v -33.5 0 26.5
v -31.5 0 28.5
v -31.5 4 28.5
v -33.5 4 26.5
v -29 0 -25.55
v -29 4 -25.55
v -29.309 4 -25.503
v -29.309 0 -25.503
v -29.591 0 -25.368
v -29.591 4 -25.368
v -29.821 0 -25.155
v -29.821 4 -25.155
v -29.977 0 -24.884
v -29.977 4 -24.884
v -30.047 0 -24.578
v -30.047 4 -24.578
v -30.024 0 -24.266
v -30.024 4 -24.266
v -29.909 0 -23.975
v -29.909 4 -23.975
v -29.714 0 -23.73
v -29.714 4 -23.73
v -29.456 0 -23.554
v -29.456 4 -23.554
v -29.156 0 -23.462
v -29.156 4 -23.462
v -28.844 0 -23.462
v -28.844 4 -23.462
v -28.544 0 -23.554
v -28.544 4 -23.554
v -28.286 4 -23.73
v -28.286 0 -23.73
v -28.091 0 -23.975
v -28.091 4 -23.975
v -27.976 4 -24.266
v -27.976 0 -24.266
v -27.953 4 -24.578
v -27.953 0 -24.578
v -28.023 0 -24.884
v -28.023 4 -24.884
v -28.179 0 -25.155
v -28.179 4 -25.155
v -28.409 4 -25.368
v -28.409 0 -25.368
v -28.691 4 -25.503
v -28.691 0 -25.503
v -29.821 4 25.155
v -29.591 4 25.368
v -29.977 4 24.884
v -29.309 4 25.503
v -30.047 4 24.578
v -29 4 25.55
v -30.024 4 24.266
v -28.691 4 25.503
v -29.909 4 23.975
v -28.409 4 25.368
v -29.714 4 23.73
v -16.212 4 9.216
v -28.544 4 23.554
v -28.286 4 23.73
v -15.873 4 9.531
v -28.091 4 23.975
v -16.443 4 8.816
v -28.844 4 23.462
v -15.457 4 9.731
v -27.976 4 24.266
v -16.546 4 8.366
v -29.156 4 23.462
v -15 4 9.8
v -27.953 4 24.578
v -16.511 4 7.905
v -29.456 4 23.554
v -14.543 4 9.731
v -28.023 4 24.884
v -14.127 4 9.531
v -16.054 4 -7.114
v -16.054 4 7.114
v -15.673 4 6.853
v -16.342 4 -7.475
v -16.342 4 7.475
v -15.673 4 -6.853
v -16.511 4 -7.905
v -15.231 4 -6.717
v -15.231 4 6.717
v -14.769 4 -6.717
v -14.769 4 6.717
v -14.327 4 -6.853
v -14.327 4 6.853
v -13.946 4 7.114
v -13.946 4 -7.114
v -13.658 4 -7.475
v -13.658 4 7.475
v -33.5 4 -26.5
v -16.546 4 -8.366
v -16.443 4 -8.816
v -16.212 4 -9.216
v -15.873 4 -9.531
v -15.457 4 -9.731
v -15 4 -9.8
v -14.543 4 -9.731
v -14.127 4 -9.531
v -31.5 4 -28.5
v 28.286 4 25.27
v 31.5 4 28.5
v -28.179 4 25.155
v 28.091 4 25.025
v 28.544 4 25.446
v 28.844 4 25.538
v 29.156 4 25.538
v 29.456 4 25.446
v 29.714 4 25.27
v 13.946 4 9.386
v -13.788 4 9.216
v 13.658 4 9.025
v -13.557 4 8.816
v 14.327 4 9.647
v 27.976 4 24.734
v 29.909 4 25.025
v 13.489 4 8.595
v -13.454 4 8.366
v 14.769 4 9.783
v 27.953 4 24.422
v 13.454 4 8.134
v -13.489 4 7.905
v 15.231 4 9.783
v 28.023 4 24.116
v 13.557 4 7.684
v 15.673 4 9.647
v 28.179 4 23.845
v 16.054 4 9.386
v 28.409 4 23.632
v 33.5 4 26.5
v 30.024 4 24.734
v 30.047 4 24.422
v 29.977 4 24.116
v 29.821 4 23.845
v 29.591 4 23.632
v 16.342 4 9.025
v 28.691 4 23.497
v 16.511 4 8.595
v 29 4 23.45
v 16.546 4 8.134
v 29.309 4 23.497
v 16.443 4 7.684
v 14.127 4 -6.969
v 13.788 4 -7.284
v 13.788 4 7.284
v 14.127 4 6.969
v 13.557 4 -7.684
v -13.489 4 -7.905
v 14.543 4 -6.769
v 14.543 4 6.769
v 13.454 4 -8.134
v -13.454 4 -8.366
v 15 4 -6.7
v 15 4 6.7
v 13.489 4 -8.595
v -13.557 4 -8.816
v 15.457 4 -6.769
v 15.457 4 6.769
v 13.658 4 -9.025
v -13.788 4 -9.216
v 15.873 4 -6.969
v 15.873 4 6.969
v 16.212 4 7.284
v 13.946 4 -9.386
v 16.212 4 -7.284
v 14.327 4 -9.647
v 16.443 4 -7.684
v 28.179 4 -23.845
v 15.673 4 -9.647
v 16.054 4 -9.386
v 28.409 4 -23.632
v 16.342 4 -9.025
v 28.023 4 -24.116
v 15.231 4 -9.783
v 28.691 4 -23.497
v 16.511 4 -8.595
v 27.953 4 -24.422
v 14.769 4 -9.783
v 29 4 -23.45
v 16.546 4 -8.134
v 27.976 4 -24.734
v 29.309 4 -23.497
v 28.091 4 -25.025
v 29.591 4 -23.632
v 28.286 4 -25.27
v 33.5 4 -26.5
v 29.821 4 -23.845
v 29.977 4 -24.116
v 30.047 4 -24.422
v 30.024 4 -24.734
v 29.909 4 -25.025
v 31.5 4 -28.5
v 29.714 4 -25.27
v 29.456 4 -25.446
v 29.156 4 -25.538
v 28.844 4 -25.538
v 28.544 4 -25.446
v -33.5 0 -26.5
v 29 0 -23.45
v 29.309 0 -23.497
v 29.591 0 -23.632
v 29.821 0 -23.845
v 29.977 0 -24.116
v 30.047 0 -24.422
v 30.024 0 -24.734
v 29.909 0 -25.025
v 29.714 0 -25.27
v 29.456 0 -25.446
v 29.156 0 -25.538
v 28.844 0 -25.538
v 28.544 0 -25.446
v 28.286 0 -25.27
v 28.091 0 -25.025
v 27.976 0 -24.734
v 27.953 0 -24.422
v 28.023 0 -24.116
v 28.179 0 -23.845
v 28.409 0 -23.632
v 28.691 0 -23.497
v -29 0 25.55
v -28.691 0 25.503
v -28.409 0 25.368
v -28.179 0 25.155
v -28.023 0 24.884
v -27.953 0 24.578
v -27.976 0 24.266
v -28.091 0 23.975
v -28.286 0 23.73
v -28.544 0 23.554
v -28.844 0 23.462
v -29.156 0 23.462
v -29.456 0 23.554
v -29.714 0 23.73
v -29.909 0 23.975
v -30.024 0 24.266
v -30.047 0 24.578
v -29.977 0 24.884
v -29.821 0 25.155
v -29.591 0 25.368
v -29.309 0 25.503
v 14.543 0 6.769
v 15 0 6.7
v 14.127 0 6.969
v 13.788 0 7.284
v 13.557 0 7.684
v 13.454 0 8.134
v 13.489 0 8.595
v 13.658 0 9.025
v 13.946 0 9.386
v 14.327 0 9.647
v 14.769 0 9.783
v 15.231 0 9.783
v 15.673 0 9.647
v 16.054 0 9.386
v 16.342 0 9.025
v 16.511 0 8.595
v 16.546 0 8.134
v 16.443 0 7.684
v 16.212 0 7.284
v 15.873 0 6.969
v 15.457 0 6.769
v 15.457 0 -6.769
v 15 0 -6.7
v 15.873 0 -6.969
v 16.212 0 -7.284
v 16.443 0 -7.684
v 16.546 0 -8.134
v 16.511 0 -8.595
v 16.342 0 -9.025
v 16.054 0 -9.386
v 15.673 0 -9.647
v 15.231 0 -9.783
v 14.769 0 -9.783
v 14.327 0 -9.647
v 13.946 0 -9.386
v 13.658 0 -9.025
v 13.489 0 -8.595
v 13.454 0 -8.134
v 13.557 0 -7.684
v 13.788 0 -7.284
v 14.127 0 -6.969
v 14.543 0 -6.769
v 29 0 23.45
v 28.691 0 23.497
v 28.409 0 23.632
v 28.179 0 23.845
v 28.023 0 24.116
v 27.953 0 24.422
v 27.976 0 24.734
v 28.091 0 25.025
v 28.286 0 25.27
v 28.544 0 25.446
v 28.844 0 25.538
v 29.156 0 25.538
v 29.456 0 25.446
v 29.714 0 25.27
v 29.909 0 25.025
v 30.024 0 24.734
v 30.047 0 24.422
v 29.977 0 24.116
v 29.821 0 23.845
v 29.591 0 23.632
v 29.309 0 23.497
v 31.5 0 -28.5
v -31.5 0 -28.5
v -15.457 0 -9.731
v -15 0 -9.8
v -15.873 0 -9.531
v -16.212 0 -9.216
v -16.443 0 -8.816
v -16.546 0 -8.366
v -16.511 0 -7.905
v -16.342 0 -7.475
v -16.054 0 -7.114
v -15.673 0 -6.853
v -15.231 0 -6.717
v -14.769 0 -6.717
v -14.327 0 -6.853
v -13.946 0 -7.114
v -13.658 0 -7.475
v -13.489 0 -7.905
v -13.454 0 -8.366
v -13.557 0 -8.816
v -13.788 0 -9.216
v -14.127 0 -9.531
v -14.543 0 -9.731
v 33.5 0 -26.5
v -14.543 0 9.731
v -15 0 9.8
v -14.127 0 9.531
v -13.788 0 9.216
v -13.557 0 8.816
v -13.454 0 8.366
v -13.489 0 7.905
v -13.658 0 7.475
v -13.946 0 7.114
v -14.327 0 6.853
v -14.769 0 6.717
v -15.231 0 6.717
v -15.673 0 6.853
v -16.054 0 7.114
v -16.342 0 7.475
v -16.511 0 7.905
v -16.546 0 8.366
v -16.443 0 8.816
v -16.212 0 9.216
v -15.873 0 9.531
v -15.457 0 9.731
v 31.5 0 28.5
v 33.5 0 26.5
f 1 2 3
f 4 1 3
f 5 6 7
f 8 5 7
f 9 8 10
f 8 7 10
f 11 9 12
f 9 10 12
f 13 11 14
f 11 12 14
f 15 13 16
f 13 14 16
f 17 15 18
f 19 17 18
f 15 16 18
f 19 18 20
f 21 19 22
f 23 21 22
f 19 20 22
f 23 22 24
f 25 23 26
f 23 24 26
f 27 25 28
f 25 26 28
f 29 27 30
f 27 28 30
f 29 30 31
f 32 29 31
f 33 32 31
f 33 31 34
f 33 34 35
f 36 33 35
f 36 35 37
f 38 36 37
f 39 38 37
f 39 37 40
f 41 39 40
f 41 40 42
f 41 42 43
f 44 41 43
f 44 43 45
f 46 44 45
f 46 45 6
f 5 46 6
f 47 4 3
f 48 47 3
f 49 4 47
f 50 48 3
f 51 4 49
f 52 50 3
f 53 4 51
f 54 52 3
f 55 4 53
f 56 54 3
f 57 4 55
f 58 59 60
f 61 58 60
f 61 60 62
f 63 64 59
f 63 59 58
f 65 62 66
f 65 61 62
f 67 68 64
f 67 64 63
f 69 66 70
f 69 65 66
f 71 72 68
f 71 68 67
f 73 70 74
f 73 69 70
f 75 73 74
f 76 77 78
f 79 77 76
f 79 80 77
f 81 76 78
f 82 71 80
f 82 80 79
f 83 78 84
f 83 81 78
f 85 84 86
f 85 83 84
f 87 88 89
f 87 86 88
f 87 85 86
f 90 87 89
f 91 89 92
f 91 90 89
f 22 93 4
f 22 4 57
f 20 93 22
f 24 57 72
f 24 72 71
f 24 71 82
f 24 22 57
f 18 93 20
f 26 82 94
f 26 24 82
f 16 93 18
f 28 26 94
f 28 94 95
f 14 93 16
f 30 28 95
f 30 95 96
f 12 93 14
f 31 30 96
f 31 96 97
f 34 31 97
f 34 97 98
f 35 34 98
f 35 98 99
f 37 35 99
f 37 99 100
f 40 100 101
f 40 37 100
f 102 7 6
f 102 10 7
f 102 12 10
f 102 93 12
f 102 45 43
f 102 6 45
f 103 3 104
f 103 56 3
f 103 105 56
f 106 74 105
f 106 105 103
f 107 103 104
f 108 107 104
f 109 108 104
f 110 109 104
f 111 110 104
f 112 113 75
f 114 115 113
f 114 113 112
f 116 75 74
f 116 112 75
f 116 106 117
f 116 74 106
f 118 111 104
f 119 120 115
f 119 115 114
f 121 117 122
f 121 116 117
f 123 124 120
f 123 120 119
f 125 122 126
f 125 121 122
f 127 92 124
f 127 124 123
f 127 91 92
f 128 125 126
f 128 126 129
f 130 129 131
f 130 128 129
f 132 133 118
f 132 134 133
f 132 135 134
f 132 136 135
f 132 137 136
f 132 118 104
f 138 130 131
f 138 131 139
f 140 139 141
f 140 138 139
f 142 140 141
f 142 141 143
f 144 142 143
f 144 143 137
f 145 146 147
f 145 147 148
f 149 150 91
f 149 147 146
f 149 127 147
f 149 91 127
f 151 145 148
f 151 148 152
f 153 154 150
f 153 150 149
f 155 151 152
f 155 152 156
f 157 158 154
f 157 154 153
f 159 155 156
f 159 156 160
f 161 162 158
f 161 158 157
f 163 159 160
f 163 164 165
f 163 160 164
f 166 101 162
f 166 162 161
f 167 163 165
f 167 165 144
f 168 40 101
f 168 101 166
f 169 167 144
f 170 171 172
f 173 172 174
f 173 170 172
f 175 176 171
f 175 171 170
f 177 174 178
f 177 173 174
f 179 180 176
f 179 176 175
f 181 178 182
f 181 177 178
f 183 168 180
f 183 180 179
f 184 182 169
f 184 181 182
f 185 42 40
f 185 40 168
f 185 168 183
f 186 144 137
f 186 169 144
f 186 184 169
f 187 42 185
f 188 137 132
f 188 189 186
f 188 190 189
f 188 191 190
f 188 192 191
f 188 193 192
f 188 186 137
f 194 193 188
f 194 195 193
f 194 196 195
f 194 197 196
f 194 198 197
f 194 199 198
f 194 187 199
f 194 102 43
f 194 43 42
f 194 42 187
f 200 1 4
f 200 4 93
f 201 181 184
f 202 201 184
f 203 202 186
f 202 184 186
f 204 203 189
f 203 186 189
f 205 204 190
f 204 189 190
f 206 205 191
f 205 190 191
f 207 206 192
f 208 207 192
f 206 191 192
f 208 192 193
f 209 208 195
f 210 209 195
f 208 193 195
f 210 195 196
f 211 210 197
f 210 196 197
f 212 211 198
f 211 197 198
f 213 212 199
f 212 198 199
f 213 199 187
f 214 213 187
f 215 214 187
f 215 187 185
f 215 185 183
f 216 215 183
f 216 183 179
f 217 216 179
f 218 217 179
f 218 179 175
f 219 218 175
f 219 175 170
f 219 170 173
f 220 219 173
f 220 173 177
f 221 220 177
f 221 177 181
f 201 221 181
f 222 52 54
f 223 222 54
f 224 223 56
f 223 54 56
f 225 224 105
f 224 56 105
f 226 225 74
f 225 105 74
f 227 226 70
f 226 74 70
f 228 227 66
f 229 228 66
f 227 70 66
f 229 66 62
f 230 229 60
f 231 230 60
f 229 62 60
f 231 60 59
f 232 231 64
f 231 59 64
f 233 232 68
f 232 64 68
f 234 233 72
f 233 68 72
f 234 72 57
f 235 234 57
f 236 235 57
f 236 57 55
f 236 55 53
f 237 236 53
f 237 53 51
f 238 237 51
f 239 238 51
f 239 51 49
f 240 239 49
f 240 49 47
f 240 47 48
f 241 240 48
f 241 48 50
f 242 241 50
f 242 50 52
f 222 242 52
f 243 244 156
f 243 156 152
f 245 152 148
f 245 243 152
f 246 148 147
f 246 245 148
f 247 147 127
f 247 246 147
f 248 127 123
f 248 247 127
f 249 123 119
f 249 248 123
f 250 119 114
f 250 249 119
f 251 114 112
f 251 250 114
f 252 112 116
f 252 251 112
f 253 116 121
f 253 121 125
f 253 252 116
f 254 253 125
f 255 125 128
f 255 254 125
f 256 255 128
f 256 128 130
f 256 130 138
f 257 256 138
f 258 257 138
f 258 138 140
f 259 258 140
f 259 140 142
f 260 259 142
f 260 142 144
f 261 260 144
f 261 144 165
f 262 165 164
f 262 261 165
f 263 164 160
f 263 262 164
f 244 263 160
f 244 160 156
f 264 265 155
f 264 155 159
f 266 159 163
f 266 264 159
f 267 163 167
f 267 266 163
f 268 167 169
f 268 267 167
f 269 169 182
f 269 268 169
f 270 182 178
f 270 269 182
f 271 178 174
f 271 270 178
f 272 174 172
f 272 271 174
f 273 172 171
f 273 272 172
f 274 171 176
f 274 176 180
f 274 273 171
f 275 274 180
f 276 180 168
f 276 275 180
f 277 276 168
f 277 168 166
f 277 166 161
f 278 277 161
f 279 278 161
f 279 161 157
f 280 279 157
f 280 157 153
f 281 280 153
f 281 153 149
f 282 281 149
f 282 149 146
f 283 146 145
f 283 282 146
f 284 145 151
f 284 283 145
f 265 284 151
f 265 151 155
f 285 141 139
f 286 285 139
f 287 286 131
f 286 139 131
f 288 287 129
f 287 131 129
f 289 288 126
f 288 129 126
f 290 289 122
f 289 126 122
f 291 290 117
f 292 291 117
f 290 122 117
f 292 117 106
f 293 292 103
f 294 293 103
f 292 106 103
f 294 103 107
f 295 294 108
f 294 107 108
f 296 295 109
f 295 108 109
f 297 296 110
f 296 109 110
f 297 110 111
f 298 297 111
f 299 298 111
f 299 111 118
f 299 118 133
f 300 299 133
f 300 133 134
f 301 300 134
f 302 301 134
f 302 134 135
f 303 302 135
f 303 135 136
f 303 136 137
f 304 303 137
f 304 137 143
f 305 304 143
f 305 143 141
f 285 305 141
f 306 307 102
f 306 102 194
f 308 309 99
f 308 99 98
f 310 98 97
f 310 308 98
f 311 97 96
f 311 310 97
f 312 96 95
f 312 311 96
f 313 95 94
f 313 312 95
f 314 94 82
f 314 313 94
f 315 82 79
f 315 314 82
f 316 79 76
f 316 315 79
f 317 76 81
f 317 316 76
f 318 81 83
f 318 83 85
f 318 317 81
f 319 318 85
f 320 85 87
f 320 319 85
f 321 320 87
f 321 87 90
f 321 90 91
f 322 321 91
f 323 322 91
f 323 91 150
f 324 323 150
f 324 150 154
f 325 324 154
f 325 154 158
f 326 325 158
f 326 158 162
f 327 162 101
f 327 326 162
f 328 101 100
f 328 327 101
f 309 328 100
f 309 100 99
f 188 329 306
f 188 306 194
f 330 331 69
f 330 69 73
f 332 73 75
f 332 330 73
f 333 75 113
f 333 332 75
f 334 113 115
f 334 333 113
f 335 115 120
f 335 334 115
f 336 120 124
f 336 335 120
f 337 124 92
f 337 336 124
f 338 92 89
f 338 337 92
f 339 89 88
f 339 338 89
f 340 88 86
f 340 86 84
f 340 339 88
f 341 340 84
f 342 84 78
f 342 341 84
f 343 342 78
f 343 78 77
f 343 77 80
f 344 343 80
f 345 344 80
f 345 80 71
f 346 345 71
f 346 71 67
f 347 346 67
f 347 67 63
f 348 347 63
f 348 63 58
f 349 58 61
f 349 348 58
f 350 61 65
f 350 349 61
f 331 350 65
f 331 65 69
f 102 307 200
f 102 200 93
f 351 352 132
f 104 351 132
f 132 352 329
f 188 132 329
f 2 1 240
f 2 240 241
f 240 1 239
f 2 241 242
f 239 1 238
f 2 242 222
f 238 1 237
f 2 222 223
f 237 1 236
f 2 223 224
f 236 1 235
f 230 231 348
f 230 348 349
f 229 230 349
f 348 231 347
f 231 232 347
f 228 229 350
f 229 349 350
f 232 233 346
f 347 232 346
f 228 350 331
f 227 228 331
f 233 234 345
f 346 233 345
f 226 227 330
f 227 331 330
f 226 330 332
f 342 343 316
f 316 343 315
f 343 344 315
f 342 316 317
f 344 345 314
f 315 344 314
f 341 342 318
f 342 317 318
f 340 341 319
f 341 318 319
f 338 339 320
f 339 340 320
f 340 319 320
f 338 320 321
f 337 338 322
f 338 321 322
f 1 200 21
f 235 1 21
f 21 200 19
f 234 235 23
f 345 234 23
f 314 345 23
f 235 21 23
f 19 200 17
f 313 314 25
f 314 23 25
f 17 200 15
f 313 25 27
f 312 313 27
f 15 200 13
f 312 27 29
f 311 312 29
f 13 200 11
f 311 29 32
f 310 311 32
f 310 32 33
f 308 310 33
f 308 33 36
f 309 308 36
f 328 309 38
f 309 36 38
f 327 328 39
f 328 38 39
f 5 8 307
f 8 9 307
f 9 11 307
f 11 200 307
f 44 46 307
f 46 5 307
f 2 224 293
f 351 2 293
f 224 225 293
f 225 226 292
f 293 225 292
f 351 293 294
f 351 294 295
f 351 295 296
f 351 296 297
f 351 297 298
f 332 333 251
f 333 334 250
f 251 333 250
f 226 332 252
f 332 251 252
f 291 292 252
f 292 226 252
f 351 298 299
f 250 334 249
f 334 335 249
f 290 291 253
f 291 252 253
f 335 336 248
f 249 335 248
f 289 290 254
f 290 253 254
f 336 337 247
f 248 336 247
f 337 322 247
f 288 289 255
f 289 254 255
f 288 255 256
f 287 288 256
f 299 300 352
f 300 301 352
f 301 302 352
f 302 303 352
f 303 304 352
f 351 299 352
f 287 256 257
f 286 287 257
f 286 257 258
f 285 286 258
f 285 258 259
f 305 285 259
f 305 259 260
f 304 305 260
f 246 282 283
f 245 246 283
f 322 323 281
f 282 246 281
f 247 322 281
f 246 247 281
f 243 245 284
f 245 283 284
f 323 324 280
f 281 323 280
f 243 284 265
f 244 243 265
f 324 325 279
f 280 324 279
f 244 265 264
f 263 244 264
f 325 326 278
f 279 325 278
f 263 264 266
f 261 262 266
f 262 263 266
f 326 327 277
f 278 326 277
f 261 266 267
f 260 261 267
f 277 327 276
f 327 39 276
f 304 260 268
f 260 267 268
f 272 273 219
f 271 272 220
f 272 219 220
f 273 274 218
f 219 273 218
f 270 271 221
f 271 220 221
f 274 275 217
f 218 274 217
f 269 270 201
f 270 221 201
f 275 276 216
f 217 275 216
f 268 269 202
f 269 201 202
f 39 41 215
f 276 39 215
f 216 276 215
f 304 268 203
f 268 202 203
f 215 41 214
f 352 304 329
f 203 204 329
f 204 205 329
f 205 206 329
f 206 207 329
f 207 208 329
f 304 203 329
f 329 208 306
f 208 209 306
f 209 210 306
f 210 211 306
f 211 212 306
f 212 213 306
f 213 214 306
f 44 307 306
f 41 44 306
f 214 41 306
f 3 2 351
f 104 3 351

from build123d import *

# Parameters (mm, degrees)
SKETCH1_W           = 67
SKETCH1_H           = 57
SKETCH1_R           = 1.55
BOSS_EXTRUDE1_DEPTH = 4
SKETCH2_R           = 1.05
CUT_EXTRUDE1_DEPTH  = 45.164465354
CHAMFER1_SIZE       = 2


with BuildPart() as part:
    # Sketch1 → Boss-Extrude1 (new body)
    with BuildSketch(Plane(origin=(0, 0, 0), x_dir=(1, 0, 0), z_dir=(0, 1, 0))):
        Rectangle(SKETCH1_W, SKETCH1_H)
        with Locations(Location((15, 8.25, 0), (0, 0, 270))):
            Circle(SKETCH1_R, mode=Mode.SUBTRACT)
        with Locations(Location((-15, 8.25, 0), (0, 0, 90))):
            Circle(SKETCH1_R, mode=Mode.SUBTRACT)
        with Locations(Location((-15, -8.25, 0), (0, 0, 270))):
            Circle(SKETCH1_R, mode=Mode.SUBTRACT)
        with Locations(Location((15, -8.25, 0), (0, 0, 90))):
            Circle(SKETCH1_R, mode=Mode.SUBTRACT)
    extrude(amount=BOSS_EXTRUDE1_DEPTH)

    # Sketch2 → Cut-Extrude1 (cut, through all)
    with BuildSketch(Plane(origin=(0, 4, 0), x_dir=(1, 0, 0), z_dir=(0, 1, 0))):
        with Locations(Location((29, 24.5, 0), (0, 0, 270))):
            Circle(SKETCH2_R)
        with Locations(Location((-29, 24.5, 0), (0, 0, 90))):
            Circle(SKETCH2_R)
        with Locations(Location((-29, -24.5, 0), (0, 0, 270))):
            Circle(SKETCH2_R)
        with Locations(Location((29, -24.5, 0), (0, 0, 90))):
            Circle(SKETCH2_R)
    extrude(amount=-CUT_EXTRUDE1_DEPTH, mode=Mode.SUBTRACT)

    # Chamfer1
    chamfer1_edges = [part.edges().sort_by_distance(p)[0] for p in [
        (33.5, 2, 28.5),
        (-33.5, 2, 28.5),
        (-33.5, 2, -28.5),
        (33.5, 2, -28.5),
    ]]
    chamfer(chamfer1_edges, length=CHAMFER1_SIZE)


solid = part.part
